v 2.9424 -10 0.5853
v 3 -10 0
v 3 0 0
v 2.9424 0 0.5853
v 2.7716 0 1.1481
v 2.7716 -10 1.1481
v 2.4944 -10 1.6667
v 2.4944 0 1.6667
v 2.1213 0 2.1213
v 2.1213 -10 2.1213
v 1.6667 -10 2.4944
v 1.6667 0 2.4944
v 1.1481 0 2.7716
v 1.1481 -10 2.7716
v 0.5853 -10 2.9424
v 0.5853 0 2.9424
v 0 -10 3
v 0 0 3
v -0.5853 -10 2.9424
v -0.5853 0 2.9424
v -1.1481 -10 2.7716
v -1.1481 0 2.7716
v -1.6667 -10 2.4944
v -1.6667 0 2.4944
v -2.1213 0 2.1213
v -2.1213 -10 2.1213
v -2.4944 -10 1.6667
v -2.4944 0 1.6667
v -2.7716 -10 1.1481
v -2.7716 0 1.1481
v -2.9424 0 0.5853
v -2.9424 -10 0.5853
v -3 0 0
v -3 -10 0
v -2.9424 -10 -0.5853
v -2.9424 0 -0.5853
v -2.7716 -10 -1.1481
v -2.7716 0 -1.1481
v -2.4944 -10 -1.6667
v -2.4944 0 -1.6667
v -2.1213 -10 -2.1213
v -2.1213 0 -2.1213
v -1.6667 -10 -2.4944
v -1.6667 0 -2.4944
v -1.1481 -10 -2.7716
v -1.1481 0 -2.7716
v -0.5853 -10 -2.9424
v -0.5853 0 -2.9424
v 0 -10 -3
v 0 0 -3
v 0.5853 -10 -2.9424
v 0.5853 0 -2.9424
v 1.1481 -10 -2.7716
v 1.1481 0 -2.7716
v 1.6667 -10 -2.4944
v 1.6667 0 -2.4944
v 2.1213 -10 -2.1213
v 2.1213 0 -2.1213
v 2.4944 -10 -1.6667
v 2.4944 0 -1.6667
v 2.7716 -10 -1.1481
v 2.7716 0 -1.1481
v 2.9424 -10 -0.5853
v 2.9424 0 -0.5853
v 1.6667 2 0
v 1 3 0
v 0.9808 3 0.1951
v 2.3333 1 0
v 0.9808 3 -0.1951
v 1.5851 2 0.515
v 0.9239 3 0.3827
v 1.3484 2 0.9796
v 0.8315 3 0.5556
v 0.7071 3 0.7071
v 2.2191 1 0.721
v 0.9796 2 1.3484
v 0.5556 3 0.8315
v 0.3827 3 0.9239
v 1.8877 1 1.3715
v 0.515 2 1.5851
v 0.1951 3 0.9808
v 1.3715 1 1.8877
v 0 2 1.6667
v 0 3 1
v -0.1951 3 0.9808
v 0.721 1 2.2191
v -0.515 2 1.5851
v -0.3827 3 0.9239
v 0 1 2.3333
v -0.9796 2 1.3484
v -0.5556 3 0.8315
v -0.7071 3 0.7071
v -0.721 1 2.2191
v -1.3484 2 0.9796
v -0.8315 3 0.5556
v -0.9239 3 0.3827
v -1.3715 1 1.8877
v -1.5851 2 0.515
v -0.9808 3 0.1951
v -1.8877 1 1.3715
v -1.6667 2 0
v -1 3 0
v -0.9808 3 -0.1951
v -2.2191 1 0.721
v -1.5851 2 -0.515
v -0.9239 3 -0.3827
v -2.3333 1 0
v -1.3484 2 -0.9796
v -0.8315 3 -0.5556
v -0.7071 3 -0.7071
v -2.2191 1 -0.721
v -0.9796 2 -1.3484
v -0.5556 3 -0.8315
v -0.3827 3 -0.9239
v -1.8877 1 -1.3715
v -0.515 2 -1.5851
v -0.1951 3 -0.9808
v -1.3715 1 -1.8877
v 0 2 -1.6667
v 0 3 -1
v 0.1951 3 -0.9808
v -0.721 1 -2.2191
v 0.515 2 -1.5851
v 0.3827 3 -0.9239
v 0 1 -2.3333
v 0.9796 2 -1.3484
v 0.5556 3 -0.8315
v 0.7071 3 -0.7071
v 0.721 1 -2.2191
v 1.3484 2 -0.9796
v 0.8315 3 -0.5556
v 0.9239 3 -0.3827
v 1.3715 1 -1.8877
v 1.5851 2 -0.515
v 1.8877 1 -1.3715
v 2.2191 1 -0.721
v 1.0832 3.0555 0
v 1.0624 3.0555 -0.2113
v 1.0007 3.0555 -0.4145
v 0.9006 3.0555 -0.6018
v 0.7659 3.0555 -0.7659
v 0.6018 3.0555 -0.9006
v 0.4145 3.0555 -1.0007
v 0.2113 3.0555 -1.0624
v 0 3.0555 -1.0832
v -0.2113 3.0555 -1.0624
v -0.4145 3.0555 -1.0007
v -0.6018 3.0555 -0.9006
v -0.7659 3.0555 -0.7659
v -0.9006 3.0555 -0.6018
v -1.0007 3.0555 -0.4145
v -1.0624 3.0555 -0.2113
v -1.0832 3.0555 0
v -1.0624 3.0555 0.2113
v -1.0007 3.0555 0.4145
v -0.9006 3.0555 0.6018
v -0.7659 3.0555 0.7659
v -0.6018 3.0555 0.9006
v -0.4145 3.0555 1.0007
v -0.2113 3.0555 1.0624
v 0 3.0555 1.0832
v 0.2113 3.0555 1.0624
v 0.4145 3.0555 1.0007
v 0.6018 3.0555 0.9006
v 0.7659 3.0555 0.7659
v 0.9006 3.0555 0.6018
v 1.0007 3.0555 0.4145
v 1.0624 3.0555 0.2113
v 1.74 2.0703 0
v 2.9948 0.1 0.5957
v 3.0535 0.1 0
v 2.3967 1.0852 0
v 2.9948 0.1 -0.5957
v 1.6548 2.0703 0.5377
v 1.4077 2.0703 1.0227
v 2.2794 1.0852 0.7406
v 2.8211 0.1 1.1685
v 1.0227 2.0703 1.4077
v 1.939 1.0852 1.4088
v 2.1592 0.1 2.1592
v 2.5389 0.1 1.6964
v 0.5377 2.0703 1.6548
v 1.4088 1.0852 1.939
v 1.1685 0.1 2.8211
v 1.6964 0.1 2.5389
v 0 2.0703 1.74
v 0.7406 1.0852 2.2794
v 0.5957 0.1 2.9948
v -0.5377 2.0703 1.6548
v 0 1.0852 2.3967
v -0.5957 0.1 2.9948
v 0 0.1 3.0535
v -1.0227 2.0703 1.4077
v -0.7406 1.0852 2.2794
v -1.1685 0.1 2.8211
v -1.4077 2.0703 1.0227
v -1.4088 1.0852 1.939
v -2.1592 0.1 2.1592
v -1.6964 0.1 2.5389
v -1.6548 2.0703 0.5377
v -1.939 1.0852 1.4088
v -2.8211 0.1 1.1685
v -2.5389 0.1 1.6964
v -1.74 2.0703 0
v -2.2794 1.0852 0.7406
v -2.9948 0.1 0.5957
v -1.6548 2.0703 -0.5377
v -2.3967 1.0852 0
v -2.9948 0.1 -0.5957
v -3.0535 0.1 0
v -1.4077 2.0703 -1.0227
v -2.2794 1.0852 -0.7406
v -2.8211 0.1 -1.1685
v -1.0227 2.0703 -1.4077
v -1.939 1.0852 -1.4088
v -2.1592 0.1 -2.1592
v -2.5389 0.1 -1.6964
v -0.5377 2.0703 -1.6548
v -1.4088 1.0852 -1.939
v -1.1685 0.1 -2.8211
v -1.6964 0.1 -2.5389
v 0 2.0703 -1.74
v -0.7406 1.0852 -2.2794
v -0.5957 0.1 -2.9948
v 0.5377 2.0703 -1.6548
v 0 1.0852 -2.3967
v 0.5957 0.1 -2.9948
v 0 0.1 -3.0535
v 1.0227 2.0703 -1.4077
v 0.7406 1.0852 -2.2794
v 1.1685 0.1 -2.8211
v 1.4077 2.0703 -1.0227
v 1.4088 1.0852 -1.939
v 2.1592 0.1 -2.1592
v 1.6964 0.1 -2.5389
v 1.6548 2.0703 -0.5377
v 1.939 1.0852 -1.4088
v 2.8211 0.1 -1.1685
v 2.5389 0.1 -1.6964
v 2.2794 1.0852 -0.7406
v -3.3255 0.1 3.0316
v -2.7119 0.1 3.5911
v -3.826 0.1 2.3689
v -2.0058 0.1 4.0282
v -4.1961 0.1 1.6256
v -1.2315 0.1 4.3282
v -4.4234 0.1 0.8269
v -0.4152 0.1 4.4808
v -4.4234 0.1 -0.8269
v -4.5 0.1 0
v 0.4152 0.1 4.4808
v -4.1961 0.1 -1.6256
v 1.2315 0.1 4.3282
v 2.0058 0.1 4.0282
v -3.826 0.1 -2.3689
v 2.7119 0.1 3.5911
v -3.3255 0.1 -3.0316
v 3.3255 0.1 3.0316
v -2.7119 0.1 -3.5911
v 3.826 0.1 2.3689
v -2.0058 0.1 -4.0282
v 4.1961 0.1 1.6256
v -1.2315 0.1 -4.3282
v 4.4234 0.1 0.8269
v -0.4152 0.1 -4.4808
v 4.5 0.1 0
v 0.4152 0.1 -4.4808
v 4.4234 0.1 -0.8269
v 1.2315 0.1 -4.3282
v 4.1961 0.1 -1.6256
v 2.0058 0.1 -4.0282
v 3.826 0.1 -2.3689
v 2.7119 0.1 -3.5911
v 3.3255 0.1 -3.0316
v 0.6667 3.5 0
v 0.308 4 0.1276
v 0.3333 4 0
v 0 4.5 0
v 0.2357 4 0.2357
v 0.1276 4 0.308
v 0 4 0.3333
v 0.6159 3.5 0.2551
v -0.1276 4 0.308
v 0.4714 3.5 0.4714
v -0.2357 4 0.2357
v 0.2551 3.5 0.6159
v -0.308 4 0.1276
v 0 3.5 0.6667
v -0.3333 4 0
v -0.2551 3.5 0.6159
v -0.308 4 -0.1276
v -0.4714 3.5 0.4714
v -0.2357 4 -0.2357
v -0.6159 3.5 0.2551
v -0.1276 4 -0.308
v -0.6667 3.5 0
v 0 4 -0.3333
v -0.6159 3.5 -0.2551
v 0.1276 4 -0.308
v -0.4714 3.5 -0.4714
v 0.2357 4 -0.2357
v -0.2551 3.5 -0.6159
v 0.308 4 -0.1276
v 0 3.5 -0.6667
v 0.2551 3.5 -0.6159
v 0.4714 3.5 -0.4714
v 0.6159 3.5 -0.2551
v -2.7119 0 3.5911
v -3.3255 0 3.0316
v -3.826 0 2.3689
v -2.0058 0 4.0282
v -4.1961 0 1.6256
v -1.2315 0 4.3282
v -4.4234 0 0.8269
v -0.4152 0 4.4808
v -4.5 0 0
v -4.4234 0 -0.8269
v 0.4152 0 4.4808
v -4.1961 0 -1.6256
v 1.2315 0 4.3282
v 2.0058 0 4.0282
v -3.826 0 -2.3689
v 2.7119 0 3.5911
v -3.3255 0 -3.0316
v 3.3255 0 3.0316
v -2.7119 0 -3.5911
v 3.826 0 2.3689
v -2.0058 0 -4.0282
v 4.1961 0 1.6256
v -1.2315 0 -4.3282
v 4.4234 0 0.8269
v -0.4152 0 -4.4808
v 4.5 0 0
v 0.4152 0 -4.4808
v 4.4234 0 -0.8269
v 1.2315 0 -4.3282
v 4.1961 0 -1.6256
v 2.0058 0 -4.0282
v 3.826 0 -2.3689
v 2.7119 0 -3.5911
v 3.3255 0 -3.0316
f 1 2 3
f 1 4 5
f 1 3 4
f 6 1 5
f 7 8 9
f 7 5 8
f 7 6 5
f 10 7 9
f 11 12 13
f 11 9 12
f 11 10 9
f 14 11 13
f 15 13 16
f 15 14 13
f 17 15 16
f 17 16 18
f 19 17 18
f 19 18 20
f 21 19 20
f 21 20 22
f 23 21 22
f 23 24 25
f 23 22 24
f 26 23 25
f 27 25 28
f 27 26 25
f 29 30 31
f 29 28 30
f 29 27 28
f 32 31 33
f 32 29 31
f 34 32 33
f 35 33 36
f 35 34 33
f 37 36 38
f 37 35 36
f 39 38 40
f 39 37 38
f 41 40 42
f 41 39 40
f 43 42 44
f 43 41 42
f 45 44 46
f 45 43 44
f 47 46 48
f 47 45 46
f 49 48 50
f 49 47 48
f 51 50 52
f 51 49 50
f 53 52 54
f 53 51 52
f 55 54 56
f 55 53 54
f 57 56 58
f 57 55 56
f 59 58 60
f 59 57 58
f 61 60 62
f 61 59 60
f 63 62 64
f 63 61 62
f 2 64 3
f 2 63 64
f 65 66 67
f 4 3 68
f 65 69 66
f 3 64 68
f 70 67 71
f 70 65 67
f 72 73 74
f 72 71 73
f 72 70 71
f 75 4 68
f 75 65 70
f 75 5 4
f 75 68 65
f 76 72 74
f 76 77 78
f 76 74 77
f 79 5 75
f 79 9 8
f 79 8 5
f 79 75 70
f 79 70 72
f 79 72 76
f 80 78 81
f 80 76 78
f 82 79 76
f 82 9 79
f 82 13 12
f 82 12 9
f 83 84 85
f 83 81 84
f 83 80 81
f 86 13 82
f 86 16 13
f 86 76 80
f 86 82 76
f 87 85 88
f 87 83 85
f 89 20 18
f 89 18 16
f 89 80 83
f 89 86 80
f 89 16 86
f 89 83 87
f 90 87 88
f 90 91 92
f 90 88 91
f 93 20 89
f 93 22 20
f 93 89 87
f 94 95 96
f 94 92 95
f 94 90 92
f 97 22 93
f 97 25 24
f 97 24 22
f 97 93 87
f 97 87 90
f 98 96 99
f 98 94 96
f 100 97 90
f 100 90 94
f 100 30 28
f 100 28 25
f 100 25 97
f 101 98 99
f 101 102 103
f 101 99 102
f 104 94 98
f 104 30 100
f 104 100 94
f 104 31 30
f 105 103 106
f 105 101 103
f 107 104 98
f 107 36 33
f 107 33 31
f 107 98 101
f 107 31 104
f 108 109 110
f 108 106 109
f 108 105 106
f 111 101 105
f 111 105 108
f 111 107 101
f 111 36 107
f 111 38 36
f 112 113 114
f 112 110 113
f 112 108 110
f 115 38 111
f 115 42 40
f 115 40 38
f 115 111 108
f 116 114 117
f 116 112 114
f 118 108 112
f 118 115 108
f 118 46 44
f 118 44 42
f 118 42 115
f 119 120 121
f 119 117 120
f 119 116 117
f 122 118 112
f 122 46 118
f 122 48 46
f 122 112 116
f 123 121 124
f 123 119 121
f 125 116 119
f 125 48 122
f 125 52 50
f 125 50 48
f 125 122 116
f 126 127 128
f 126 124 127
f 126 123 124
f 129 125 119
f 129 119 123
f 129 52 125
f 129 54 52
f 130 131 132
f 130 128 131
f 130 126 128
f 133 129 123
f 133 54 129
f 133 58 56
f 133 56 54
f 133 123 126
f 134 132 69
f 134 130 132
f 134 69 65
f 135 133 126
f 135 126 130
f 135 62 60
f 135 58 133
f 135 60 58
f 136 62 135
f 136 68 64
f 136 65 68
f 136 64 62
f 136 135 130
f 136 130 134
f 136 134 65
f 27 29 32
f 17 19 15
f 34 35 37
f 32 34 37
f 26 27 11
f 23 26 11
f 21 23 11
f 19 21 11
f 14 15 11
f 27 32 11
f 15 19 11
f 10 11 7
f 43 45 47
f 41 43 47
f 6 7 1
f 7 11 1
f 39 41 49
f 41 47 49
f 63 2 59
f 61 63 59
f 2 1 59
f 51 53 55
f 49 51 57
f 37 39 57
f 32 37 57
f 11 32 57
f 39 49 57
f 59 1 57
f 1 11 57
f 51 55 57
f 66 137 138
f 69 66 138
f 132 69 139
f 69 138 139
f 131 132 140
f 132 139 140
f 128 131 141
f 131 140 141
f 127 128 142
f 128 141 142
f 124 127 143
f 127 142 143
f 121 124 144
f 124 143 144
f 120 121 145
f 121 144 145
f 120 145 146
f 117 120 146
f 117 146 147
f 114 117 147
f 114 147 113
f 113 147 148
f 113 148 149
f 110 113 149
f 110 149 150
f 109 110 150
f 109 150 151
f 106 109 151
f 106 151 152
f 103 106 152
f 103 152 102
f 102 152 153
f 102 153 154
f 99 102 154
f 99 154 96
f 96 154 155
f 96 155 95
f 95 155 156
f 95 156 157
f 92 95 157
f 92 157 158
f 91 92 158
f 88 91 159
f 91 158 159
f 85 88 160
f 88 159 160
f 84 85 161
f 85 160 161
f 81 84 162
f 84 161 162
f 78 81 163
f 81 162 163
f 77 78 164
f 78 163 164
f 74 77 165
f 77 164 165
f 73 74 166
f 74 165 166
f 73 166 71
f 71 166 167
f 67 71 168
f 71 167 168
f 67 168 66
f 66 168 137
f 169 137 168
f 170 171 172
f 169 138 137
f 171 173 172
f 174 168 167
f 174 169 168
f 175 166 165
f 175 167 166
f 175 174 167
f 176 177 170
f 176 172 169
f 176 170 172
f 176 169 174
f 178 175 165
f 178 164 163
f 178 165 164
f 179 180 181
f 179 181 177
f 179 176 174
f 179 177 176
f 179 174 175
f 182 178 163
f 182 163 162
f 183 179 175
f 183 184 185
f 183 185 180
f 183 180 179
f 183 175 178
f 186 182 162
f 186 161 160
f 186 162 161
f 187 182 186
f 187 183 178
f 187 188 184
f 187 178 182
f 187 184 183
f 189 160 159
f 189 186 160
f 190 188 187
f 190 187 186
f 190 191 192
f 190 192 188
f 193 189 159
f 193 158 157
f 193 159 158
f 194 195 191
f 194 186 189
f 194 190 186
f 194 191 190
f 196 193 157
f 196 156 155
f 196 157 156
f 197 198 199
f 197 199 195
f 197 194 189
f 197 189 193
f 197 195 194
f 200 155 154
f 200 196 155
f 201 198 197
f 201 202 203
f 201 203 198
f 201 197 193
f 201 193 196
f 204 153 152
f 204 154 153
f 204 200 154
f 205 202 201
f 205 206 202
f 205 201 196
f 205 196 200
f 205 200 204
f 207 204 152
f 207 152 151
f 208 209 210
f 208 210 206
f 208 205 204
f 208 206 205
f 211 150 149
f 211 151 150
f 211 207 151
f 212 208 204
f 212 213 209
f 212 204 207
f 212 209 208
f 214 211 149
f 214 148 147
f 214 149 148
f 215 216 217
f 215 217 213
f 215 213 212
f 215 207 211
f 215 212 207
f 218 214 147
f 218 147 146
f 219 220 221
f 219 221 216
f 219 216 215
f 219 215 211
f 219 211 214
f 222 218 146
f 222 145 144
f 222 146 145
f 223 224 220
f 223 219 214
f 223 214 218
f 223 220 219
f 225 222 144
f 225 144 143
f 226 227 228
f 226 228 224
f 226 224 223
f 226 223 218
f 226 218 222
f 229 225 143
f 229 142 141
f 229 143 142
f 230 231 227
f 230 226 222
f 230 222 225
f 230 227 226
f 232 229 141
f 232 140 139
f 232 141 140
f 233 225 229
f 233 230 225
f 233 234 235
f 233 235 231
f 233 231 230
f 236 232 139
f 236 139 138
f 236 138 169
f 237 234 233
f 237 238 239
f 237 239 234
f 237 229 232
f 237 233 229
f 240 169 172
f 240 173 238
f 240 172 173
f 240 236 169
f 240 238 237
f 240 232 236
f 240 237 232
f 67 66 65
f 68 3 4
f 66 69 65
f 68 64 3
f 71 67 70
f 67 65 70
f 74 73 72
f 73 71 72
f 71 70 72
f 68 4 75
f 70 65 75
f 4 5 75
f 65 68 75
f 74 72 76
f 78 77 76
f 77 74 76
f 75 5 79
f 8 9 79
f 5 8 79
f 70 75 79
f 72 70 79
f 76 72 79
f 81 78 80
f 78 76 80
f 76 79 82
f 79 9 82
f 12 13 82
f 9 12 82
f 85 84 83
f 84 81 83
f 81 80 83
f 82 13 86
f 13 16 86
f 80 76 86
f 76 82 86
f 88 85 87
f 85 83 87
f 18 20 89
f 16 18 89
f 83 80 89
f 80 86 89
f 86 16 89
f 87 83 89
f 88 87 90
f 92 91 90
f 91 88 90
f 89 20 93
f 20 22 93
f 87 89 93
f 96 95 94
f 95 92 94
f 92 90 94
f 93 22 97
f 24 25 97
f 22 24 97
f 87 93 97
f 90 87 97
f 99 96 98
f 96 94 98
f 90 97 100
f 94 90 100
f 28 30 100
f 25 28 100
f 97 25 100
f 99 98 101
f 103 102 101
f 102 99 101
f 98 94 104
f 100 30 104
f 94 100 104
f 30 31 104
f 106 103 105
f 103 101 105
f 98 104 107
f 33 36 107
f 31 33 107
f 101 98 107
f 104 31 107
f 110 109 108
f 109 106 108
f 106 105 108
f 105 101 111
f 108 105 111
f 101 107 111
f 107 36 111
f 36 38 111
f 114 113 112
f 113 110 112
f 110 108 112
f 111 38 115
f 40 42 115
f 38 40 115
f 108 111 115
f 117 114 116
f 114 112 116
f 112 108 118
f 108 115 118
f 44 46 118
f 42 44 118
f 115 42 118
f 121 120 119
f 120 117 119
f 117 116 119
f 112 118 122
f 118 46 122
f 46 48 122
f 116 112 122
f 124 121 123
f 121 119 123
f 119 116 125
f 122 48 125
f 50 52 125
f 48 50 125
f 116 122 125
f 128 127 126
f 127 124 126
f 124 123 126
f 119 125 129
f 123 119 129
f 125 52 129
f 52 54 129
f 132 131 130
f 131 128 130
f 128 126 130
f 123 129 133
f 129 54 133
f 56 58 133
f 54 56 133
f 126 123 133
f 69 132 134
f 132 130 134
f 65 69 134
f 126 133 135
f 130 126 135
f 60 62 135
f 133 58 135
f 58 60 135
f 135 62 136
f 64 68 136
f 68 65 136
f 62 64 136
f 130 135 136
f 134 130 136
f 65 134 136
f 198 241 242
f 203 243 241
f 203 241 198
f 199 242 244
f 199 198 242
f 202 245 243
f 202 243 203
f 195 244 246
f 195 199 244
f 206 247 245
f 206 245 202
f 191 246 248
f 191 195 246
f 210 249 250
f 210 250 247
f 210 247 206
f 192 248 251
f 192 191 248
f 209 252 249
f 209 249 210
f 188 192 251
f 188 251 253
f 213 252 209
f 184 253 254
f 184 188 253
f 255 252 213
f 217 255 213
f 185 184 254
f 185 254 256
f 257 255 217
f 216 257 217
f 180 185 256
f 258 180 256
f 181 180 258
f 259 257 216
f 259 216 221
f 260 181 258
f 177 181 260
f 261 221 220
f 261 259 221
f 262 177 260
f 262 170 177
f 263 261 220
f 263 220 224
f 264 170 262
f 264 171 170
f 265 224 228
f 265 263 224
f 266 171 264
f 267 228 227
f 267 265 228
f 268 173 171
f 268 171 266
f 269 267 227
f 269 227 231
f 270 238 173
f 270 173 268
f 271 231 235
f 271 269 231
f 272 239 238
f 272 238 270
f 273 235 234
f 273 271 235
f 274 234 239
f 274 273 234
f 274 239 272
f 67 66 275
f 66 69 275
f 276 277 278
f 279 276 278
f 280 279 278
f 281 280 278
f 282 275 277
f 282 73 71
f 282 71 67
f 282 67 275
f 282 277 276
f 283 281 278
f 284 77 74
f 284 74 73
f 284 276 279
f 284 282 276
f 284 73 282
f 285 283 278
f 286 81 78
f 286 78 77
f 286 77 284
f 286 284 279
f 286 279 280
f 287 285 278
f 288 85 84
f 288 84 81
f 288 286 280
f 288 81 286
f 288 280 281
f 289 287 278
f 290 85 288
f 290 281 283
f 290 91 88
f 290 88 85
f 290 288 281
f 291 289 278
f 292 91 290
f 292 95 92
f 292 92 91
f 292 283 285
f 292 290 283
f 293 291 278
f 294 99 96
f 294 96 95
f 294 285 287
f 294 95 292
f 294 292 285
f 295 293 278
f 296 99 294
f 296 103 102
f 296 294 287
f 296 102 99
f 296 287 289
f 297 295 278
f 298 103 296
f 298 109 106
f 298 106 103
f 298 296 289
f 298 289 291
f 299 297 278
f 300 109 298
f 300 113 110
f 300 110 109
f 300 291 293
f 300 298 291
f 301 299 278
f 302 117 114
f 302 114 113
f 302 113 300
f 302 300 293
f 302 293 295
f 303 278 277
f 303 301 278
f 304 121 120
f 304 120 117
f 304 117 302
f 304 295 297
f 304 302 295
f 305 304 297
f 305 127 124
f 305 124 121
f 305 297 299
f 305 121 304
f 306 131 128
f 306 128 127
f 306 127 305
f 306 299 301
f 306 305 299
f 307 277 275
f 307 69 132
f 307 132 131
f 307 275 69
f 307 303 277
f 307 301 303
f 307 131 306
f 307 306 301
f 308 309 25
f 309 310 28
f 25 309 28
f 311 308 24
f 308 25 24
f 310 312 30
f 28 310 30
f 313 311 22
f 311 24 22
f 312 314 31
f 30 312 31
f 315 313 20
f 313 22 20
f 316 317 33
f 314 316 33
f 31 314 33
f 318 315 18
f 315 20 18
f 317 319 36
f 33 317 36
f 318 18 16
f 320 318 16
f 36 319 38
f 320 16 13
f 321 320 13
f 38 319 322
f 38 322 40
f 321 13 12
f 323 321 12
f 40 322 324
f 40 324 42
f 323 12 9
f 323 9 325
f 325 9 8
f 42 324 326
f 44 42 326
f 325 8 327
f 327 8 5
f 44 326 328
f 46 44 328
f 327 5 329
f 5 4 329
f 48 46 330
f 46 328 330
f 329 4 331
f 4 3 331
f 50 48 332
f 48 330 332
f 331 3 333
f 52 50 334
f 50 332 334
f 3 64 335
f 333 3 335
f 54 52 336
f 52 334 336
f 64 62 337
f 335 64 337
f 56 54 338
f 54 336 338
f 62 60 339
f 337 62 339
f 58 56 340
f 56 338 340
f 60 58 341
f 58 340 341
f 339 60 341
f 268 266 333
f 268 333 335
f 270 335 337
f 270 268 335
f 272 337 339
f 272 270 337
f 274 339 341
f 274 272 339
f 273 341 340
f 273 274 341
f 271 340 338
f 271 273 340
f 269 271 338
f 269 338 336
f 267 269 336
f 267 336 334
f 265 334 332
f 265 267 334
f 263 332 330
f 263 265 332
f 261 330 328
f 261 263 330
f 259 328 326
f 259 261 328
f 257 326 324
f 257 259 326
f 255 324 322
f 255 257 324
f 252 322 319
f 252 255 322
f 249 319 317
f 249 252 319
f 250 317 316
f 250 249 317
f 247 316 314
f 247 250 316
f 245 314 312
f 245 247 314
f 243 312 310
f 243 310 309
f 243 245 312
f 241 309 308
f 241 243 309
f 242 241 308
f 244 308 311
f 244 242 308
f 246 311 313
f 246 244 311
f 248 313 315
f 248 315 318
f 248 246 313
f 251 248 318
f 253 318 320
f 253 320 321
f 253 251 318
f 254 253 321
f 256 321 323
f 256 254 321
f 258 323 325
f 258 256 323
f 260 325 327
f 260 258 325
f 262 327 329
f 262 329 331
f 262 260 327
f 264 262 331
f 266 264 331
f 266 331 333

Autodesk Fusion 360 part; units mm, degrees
sketch "Sketch1" plane through (0, 0, 0) normal (0, 0, 1) x (1, 0, 0)
  line L0 (0, 3) -> (1, 3) construction
  line L1 (0, 0) -> (3, 0) construction
  line L2 (1, 3) -> (3, 0)
  line L3 (3, 0) -> (4.5, 0)
  line L4 (4.5, 0) -> (4.5, 0.1)
  line L5 (1, 3) -> (1.0832, 3.0555)
  line L6 (4.5, 0.1) -> (3.0535, 0.1)
  line L7 (3.0535, 0.1) -> (1.0832, 3.0555)
  line L8 (0, 4.5) -> (3, 0)
  line L9 (3, 0) -> (3, -10)
  line L10 (3, -10) -> (0, -10)
  line L11 (0, 1.75) -> (0, 22.5)
  line L12 (0, 4.5) -> (0, -10)
  dimension "d1" = 1
  dimension "d3" = 3
  dimension "d4" = 3
  dimension "d5" = 1.5
  dimension "d6" = 0.1
  dimension "d7" = 0.1
  dimension "d9" = 123.69
  dimension "d11" = 10
revolve "Revolve1" add sketch "Sketch1" angle 360 about axis through (0, 1.75, 0) along (0, 1, 0) contours L2 L3 L4 L5 L6 L7 L8 makes body 1
revolve "Revolve2" add sketch "Sketch1" angle 360 about axis through (0, 1.75, 0) along (0, 1, 0) separate body contours L2 L8 L9 L10 L11 L12 makes body 2
